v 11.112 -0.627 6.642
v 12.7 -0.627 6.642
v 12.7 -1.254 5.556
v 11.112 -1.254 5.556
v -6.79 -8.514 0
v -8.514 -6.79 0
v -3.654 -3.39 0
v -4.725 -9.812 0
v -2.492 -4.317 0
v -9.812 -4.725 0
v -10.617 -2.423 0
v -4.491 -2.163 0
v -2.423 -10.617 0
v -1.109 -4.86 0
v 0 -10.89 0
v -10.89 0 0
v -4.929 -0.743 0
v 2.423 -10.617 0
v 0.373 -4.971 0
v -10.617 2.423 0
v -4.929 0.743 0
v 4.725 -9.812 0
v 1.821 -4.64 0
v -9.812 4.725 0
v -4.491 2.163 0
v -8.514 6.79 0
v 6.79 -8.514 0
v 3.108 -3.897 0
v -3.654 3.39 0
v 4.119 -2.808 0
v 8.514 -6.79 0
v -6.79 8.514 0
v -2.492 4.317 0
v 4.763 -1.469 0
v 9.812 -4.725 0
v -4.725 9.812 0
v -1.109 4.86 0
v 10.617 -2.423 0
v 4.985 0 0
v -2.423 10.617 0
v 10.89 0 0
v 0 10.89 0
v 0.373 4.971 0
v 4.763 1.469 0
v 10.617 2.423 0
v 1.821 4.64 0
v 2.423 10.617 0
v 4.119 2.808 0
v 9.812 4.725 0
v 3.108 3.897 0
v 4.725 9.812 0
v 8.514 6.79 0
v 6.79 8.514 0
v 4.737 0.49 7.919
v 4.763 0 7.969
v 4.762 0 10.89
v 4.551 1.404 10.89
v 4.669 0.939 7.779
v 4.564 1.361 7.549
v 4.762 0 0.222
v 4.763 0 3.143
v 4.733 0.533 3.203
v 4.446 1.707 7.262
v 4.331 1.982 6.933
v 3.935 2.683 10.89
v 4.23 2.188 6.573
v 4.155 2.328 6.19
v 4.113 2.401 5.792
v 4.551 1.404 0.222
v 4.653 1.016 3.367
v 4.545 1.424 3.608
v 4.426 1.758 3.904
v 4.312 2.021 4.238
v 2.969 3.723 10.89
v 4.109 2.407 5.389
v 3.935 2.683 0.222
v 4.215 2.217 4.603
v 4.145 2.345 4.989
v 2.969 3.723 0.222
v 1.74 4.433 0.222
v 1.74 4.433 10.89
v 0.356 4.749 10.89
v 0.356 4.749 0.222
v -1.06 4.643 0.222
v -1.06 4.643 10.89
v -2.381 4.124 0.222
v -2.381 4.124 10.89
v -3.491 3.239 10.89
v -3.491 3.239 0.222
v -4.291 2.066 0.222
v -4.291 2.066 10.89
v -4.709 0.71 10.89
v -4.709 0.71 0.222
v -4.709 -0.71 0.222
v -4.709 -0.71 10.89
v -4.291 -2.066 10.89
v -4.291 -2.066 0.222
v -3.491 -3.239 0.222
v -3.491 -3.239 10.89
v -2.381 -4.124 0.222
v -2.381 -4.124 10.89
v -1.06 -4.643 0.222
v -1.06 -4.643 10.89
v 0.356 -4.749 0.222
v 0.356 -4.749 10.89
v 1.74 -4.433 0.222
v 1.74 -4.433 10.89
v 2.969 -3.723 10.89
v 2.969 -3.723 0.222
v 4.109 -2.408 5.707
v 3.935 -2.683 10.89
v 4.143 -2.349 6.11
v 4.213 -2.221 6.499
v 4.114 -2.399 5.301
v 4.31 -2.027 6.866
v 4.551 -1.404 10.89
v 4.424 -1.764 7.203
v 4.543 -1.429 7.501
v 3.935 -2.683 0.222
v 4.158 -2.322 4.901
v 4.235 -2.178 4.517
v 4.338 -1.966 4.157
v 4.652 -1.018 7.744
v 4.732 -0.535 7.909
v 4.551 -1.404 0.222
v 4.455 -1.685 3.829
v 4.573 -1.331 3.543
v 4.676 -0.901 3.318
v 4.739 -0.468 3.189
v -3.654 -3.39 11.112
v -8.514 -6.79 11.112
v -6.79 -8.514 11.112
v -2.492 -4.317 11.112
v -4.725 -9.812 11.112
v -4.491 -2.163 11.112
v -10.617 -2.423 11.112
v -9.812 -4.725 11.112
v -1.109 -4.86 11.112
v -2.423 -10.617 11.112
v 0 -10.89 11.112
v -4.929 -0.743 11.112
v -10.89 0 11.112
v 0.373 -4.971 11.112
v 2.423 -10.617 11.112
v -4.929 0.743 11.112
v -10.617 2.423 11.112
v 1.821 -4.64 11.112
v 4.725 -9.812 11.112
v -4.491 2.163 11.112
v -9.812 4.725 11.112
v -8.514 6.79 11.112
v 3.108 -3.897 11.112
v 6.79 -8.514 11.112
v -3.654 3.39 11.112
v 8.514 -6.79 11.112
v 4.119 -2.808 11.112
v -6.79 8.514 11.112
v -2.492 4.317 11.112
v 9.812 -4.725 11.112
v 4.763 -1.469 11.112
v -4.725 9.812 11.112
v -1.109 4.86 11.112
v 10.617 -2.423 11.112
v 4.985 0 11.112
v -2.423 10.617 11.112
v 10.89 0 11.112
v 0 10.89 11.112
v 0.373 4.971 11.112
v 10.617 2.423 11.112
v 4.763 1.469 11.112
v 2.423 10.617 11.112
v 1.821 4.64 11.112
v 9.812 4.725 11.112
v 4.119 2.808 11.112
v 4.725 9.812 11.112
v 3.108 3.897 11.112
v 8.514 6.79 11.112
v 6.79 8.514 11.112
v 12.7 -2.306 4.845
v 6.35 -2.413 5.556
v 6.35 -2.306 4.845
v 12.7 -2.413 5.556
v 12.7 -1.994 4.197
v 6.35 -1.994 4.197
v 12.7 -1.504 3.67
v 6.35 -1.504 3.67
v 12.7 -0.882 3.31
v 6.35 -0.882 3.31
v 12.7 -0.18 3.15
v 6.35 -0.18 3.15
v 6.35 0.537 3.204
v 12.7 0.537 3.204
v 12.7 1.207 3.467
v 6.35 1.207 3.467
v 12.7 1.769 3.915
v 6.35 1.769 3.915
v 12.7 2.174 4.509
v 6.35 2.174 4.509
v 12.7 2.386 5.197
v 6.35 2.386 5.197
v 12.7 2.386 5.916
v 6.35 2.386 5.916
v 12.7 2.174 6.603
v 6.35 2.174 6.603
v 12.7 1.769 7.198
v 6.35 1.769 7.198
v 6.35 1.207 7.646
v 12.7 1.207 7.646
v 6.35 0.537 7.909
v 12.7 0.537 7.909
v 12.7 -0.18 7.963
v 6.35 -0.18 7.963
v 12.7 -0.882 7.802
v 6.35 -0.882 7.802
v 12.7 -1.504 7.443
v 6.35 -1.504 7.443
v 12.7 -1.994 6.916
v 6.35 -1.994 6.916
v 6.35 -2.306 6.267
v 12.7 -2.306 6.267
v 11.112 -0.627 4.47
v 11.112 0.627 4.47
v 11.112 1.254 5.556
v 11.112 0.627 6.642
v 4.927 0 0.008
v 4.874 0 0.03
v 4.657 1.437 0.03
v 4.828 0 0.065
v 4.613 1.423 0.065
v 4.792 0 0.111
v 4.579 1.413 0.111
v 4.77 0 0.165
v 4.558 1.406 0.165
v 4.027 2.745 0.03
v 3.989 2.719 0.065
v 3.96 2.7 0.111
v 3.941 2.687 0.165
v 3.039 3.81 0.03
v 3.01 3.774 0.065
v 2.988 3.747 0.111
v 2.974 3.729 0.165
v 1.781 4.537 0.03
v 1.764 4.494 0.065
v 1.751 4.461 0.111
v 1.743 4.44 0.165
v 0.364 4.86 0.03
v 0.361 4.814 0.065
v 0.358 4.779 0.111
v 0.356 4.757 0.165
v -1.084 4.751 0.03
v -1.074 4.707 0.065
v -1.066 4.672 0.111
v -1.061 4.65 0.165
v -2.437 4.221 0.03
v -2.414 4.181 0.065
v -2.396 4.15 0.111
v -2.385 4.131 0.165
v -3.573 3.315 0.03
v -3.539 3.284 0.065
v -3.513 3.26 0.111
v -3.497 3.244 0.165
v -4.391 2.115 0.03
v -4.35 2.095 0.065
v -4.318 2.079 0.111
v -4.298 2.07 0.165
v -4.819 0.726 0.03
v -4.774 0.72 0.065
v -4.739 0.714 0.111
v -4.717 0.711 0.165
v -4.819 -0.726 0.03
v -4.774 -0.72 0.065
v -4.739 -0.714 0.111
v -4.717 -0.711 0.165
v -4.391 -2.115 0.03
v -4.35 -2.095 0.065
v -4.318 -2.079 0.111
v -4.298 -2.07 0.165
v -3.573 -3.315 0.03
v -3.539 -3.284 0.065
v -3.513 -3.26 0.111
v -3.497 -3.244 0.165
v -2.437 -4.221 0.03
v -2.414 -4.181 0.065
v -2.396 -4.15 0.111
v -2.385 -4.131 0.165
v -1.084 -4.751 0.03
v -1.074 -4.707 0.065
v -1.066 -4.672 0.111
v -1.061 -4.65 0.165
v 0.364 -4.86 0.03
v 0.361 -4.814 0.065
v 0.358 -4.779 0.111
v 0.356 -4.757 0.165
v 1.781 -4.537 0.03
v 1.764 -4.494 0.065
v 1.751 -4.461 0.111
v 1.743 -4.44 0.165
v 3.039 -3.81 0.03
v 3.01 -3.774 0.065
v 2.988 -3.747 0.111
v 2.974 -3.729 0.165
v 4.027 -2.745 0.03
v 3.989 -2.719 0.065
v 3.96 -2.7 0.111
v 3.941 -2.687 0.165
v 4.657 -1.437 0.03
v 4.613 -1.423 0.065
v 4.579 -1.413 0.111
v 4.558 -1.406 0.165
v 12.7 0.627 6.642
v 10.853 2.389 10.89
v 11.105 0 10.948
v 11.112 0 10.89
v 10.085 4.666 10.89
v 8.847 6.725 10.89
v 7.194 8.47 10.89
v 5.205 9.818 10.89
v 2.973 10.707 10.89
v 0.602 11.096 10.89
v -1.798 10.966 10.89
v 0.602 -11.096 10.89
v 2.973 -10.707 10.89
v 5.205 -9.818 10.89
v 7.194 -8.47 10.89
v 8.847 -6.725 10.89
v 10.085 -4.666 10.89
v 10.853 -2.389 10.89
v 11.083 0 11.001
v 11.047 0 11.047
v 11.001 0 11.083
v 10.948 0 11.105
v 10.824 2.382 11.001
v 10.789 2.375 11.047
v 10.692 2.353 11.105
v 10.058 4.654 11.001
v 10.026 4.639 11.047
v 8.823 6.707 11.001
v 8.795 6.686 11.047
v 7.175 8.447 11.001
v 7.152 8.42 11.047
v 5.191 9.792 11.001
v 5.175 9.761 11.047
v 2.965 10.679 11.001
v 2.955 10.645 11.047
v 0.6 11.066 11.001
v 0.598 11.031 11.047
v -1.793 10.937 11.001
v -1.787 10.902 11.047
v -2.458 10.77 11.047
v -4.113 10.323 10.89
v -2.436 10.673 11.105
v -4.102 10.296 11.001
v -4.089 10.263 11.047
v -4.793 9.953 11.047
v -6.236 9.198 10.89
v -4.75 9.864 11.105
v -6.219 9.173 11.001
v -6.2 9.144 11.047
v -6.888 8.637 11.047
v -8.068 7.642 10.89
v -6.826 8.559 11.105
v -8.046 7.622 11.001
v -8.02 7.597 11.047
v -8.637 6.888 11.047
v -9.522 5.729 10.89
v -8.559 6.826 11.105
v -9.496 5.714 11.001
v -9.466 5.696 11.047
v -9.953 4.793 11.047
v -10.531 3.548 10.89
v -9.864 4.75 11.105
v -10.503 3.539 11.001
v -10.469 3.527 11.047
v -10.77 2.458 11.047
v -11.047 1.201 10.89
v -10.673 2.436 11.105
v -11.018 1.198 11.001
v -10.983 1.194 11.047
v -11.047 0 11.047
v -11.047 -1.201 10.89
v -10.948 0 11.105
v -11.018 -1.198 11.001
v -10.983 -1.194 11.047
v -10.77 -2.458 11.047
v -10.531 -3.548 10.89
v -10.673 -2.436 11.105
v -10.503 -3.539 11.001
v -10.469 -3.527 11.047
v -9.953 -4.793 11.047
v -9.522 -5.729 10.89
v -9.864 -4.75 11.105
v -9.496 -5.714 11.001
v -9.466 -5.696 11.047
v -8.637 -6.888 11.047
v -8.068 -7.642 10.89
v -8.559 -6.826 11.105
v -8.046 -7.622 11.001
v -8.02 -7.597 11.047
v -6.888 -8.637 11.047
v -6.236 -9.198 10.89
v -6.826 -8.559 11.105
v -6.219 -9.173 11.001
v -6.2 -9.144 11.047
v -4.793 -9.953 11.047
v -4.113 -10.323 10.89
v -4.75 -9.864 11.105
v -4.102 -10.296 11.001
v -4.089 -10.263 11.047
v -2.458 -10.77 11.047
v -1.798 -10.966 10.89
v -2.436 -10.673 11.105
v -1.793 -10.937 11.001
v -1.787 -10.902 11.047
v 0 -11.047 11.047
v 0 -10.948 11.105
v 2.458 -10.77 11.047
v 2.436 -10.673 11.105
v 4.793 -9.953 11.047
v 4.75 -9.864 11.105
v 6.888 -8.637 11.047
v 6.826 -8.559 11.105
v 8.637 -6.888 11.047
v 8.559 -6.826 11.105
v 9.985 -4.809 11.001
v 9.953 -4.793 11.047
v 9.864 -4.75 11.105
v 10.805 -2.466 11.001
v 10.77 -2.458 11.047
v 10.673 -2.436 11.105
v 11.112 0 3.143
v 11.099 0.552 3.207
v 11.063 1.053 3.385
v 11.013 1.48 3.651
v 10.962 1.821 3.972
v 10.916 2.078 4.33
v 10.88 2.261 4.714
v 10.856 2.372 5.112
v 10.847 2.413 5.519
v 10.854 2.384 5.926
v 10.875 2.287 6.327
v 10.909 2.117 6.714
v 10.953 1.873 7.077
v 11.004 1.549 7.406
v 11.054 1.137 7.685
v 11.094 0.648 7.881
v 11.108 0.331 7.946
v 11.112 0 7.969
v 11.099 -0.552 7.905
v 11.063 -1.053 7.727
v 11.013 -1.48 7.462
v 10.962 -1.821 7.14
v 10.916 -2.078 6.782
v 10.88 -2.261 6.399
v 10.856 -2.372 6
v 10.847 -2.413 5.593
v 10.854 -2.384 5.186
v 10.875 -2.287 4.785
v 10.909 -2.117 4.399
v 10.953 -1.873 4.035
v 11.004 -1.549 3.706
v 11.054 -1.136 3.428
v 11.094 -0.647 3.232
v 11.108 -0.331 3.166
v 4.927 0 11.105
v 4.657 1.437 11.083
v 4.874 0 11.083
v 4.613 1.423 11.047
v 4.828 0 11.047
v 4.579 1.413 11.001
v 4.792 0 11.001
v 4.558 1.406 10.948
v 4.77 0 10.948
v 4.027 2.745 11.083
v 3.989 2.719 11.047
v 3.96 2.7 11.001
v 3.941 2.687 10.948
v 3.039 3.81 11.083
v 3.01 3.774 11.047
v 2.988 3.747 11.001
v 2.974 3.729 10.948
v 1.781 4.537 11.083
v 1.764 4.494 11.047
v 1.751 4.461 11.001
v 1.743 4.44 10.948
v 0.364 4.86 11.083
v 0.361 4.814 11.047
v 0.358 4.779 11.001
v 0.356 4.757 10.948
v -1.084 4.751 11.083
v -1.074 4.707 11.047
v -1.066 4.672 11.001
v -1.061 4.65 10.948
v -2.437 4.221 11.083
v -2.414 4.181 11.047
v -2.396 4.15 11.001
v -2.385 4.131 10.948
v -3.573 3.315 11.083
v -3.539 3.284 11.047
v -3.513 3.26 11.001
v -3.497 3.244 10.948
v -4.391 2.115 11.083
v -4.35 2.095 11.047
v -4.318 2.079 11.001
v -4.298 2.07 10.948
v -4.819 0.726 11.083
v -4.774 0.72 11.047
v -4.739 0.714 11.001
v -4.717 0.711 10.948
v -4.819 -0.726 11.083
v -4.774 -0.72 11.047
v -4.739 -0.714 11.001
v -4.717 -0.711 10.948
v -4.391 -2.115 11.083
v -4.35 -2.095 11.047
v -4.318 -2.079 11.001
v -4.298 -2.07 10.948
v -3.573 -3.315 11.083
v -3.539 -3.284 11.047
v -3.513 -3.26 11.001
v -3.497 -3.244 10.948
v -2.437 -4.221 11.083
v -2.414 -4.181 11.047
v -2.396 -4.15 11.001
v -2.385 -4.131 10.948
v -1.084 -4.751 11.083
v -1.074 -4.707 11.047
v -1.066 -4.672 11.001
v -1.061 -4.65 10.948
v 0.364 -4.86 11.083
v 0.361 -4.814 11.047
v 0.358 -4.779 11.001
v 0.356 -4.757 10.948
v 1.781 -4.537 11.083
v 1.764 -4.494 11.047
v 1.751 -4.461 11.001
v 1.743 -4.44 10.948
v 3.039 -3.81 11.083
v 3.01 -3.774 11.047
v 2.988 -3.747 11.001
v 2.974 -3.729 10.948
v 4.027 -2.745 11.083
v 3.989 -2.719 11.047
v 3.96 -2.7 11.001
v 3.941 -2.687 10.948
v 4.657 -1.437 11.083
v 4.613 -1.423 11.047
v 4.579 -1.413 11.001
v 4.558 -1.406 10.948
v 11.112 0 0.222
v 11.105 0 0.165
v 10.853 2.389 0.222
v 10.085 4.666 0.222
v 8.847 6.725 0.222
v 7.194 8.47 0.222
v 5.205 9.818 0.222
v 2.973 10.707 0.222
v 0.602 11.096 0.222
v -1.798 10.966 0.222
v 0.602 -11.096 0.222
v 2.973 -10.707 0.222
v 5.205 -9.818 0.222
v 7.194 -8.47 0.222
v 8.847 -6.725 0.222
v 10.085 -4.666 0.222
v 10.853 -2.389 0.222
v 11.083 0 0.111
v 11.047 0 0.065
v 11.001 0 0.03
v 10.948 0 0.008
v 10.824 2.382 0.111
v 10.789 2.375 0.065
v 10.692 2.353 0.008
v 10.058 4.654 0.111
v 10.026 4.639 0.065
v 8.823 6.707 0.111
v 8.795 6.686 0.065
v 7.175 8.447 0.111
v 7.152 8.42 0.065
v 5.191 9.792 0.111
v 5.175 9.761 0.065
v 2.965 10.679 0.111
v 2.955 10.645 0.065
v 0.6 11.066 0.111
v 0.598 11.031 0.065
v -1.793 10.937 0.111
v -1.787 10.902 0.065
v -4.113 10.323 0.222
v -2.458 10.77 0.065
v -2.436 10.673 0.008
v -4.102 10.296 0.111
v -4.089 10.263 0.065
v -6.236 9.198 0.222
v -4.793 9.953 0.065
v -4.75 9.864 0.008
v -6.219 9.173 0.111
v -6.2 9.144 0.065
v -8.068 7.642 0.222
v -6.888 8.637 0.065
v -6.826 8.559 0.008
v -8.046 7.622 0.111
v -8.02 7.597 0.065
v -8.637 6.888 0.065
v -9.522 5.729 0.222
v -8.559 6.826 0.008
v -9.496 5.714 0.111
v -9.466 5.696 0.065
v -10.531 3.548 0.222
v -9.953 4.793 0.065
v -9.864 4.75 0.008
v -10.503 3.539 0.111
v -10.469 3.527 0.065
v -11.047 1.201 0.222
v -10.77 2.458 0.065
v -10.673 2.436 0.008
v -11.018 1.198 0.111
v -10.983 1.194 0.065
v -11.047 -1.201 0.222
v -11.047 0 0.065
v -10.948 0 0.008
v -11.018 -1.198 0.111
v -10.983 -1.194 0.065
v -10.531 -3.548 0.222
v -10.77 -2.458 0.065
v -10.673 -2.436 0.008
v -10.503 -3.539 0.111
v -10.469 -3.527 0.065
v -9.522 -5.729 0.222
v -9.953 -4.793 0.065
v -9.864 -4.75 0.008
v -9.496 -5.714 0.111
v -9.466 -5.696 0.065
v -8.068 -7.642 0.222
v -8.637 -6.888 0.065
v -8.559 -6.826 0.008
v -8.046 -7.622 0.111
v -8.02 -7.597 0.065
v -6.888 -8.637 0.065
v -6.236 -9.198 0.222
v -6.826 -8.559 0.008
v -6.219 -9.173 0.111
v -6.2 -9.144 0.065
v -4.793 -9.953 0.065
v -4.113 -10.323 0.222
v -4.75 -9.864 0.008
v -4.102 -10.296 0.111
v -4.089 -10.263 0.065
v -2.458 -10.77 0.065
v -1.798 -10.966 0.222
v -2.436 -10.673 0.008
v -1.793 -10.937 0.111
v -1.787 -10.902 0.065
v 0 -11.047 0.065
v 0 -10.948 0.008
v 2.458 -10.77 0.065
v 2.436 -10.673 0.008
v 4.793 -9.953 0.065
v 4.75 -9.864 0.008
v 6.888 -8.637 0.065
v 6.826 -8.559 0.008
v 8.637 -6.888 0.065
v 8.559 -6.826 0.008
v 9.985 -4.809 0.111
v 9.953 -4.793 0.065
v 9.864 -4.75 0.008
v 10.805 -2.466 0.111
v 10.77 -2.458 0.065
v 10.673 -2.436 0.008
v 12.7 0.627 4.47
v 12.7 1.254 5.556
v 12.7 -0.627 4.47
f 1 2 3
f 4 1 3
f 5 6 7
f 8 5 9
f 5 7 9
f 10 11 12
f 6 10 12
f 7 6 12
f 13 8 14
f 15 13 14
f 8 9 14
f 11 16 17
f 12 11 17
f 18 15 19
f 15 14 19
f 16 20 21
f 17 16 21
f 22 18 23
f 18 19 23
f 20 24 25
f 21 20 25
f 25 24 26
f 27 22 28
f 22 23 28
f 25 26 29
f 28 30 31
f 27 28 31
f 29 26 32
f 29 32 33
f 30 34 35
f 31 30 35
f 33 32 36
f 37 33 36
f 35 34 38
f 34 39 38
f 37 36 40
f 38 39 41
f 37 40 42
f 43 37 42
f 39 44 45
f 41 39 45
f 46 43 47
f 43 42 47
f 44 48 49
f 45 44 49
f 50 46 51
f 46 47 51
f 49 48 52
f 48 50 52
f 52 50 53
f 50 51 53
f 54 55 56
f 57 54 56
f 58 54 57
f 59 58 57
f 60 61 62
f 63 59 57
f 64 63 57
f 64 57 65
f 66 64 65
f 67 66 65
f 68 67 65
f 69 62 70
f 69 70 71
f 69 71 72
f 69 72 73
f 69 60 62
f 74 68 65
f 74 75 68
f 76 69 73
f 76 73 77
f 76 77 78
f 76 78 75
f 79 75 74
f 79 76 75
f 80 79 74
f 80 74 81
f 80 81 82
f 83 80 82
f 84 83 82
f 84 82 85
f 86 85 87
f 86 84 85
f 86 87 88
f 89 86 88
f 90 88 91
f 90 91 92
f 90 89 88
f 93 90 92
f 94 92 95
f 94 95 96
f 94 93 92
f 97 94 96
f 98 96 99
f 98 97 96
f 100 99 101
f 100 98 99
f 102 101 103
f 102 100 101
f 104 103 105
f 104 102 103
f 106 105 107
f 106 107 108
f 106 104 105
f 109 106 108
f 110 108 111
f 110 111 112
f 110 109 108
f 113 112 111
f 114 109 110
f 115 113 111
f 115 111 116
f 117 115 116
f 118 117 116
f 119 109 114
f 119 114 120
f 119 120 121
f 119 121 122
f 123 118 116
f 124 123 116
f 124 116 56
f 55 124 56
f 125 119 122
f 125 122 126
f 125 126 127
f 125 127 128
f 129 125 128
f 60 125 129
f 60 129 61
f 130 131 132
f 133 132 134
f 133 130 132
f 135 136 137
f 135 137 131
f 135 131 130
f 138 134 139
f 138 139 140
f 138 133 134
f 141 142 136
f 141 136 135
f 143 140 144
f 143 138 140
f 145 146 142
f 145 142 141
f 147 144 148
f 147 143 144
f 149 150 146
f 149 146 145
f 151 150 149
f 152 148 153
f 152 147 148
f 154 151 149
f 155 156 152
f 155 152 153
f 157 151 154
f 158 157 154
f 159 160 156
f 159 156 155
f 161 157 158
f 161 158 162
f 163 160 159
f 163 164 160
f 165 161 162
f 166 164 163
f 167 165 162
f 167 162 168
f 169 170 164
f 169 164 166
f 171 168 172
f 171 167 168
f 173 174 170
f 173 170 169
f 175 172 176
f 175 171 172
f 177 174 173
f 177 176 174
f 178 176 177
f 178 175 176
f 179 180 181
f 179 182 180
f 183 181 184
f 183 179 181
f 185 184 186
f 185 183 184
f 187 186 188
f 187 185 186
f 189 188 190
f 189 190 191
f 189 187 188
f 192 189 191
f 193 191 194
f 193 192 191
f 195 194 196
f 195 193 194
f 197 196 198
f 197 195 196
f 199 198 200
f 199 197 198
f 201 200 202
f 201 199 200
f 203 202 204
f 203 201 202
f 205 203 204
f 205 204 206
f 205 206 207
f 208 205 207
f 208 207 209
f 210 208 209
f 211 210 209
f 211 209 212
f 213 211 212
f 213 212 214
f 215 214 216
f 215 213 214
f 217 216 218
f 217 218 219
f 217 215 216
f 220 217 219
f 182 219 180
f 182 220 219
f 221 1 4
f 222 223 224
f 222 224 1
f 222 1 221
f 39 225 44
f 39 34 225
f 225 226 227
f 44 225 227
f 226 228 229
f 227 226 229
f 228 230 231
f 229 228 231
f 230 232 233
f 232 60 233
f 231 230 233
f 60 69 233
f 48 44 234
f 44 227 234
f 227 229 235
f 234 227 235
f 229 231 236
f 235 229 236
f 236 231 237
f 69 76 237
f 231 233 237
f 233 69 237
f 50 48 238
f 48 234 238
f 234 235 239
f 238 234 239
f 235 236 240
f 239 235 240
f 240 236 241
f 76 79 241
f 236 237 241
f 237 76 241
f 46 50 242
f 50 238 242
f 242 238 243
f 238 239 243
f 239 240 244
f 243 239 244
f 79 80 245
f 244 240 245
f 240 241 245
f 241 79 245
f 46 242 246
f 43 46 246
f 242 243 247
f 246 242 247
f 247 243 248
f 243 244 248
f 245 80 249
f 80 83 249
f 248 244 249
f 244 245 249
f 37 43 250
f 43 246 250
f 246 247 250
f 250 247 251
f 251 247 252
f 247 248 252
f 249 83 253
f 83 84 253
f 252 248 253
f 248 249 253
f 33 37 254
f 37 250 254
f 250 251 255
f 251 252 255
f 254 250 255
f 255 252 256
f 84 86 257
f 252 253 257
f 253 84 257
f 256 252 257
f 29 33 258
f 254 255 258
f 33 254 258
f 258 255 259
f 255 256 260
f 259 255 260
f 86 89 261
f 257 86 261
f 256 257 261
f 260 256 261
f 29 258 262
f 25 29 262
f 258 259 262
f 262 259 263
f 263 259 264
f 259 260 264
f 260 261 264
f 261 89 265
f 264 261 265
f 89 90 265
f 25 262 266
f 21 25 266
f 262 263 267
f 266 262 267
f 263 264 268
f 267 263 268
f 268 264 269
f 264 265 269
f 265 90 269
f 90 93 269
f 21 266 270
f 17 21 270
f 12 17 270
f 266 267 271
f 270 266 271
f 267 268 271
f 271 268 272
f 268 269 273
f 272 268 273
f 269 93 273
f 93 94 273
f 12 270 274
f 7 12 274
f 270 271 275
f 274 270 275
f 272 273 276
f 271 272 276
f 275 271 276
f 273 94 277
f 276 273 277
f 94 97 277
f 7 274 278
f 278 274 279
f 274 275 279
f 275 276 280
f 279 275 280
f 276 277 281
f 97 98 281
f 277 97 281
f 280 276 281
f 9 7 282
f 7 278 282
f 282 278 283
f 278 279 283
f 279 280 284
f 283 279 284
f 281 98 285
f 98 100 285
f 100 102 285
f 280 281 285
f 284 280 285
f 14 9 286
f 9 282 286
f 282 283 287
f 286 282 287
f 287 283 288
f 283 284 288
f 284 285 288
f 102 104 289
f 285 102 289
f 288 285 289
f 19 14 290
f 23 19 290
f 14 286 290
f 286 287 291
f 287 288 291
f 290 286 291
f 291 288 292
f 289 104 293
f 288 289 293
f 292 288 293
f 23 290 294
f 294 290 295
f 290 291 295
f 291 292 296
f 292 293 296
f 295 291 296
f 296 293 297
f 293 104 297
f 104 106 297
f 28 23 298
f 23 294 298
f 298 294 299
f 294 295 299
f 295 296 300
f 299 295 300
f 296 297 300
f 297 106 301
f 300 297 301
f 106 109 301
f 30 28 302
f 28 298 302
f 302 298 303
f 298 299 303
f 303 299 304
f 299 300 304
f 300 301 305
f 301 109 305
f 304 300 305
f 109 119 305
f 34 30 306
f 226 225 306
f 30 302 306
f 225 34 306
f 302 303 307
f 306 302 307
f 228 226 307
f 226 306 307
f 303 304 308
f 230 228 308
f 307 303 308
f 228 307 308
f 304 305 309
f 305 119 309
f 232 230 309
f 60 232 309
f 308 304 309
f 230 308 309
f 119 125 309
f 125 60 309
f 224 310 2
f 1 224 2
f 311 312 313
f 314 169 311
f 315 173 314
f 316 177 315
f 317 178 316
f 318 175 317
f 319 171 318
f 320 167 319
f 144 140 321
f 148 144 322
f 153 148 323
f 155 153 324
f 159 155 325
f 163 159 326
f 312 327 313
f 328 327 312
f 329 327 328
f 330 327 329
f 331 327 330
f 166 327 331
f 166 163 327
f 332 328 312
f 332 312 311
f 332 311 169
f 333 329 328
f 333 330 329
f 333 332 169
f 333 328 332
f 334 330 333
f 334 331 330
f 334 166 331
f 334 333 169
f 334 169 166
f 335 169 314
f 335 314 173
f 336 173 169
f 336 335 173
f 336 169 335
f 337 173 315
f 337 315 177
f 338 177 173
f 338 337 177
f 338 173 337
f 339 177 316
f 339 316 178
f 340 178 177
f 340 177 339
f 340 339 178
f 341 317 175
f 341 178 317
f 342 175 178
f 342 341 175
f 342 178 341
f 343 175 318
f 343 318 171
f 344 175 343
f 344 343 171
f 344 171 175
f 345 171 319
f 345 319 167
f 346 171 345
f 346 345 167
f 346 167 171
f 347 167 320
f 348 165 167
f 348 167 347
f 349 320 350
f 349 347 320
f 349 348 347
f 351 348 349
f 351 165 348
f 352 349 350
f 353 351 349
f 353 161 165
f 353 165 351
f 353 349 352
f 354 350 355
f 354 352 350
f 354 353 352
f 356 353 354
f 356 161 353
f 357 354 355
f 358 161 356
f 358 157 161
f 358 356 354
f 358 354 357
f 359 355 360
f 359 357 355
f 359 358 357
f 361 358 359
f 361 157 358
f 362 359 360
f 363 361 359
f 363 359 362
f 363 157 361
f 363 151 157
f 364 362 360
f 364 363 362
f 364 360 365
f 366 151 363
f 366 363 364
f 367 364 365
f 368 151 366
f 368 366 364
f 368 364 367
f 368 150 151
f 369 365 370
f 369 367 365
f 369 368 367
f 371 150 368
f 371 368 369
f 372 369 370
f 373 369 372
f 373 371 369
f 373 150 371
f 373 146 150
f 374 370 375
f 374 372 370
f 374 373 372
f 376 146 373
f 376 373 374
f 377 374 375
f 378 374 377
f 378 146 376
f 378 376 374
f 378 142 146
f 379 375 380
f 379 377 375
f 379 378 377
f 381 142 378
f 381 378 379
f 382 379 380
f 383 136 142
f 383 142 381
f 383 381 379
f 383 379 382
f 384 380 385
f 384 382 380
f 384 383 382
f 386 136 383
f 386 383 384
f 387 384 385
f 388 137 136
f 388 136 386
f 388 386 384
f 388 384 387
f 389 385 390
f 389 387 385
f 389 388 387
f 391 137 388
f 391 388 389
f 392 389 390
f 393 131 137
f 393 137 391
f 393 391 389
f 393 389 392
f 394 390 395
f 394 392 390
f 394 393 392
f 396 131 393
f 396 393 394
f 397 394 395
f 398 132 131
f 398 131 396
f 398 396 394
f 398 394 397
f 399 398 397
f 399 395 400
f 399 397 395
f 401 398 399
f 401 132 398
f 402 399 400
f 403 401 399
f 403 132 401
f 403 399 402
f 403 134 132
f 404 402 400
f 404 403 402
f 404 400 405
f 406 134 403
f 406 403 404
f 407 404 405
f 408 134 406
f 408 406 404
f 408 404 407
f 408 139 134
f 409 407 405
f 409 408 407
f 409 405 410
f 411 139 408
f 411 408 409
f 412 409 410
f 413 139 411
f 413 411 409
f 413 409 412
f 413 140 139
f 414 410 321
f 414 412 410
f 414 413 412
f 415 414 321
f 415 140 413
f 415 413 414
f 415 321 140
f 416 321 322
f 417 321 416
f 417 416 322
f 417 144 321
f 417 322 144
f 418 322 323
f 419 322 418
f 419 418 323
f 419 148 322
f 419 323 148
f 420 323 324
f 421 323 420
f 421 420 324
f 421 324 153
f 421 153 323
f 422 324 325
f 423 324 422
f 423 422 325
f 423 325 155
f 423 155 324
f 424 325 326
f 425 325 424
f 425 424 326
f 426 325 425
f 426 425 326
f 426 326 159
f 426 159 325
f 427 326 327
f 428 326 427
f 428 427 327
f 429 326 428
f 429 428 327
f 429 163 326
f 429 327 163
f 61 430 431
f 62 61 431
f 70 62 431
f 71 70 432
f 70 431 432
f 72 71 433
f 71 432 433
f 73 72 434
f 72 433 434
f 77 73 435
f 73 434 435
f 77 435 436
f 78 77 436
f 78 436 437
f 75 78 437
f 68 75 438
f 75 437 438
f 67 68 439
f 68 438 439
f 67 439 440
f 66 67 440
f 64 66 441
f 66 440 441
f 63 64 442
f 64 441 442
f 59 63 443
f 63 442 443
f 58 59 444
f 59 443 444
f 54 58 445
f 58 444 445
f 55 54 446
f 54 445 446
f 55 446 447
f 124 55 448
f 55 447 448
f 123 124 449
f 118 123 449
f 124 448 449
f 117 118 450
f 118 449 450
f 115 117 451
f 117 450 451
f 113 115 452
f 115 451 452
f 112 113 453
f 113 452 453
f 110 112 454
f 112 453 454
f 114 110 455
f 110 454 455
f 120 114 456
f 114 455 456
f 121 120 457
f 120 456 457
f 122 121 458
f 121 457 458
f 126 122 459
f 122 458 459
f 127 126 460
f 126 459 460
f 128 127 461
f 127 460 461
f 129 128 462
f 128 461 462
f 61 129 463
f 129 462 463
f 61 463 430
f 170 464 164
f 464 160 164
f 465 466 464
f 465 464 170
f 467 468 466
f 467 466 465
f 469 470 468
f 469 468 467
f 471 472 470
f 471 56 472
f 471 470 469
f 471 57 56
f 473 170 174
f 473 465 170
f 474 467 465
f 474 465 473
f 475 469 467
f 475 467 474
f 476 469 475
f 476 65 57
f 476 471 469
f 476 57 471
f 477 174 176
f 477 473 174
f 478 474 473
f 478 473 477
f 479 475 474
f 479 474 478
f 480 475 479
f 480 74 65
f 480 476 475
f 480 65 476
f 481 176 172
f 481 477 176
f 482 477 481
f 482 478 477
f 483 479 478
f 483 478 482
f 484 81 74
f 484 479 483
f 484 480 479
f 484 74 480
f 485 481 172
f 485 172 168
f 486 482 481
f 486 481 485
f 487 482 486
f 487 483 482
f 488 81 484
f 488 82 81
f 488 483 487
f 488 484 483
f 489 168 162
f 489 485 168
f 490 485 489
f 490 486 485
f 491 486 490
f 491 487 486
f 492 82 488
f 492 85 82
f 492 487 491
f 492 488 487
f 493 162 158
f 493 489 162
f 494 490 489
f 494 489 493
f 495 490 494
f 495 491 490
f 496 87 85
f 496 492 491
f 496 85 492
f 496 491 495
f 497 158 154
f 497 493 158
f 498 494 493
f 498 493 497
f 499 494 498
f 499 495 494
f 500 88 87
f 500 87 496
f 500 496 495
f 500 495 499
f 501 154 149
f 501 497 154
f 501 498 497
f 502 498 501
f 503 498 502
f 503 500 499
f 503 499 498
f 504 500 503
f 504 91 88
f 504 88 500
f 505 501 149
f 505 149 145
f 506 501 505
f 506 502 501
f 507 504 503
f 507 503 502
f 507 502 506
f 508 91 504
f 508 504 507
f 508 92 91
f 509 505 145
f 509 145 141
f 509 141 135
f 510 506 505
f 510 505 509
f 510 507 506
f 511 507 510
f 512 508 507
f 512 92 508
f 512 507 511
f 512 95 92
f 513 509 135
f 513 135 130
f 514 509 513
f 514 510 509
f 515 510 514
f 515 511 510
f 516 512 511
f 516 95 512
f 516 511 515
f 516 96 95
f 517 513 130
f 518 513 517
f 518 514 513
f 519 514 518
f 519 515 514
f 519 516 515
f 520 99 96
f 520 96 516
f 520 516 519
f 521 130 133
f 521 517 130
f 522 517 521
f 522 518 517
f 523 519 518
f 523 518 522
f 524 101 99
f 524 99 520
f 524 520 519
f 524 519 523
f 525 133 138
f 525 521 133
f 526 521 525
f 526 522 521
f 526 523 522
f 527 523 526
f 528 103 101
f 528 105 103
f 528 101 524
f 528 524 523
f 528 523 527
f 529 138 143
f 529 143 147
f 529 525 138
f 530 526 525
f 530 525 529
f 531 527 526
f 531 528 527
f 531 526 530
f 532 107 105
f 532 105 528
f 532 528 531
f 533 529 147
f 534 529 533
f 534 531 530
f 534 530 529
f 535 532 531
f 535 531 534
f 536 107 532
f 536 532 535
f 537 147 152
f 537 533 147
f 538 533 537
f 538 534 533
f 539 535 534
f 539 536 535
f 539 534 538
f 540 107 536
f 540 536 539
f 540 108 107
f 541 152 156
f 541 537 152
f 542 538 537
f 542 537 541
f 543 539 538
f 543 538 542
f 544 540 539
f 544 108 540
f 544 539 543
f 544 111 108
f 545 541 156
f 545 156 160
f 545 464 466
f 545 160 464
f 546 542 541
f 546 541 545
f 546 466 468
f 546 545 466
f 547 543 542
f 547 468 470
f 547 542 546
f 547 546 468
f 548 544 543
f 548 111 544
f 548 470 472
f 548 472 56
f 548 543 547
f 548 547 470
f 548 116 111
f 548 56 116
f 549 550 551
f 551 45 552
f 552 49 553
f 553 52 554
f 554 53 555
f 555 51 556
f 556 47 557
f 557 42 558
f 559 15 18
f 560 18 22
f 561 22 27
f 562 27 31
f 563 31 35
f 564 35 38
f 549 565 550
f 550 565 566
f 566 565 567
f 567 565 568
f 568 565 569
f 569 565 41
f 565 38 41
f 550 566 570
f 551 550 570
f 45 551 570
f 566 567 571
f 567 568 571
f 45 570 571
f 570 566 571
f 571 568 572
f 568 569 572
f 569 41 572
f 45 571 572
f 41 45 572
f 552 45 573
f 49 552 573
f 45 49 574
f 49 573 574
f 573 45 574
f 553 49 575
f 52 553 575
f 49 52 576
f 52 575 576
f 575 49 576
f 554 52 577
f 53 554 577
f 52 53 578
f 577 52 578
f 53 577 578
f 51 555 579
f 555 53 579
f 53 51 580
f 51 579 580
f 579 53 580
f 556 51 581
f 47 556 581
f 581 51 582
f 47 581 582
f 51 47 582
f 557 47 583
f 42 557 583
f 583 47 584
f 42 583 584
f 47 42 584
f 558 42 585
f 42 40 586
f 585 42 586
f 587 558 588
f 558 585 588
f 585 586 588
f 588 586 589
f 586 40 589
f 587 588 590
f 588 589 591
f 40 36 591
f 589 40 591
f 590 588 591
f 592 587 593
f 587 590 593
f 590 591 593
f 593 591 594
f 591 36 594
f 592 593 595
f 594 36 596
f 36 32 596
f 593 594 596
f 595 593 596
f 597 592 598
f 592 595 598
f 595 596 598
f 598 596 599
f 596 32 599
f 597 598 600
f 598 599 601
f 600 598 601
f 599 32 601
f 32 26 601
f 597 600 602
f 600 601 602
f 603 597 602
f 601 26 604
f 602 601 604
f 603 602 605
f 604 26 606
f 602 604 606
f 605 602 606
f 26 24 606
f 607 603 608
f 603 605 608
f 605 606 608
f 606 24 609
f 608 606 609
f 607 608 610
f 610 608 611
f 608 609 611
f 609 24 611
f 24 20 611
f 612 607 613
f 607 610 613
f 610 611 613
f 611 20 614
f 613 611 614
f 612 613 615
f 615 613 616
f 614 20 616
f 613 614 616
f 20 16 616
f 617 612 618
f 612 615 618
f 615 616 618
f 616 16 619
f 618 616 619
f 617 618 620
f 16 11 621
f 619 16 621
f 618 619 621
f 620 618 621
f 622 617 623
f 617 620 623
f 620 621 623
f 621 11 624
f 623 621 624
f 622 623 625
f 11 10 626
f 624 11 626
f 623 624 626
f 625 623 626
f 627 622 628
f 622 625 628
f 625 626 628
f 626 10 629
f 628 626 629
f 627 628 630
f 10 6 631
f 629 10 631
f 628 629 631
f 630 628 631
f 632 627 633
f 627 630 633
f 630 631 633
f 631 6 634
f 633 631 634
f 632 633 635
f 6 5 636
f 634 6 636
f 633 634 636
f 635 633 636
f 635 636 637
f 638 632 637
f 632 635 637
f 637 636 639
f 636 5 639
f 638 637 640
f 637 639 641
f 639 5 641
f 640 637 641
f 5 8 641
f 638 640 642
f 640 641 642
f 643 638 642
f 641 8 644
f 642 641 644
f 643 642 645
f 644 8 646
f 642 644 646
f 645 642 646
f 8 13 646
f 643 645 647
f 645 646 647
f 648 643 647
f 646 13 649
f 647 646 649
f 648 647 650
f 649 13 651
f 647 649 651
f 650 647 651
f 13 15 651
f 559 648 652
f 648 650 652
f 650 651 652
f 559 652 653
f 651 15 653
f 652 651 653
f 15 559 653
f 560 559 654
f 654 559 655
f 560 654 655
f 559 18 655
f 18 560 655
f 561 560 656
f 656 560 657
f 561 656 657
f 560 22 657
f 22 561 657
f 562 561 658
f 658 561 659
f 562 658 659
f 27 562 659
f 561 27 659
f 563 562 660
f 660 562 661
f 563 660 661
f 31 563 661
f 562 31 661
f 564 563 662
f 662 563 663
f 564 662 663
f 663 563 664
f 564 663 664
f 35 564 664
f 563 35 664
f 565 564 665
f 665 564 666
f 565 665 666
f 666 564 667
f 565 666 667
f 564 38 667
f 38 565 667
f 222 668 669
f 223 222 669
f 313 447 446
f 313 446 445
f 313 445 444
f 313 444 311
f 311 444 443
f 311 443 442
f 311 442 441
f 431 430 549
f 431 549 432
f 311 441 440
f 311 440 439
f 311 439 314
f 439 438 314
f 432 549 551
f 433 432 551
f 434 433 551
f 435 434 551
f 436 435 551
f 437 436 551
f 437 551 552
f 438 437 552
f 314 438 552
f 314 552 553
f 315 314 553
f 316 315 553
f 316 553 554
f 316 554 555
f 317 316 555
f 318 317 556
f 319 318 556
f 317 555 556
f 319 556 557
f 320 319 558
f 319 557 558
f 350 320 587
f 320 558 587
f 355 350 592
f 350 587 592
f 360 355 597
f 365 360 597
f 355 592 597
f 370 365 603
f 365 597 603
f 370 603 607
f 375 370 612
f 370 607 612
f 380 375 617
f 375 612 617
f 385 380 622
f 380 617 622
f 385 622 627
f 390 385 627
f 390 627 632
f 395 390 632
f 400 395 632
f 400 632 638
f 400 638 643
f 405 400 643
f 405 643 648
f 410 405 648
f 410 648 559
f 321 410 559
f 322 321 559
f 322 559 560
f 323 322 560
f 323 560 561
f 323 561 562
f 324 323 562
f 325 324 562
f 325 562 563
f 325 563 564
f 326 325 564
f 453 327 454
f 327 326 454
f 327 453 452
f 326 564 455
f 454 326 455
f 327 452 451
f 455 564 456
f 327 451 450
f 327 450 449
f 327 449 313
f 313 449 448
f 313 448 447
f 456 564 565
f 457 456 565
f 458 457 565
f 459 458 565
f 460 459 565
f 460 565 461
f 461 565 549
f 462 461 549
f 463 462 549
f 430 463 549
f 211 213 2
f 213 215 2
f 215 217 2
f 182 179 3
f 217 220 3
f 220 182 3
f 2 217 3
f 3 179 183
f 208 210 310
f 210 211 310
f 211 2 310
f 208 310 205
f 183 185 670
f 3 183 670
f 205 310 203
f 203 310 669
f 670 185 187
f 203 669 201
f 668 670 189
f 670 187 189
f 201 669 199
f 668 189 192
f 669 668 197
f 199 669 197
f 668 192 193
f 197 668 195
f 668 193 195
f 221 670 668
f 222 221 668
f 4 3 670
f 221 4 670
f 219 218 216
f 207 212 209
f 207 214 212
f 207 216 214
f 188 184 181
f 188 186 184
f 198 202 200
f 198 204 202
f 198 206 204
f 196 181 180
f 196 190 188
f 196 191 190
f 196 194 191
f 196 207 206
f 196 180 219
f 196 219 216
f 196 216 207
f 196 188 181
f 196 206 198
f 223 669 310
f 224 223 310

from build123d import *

# Parameters (mm, degrees)
SKETCH1_R               = 11.1125
SKETCH1_R_2             = 4.7625
EXTRUDE1_DEPTH          = 11.1125
CUT_EXTRUDE1_REACH      = 29.22
CUT_EXTRUDE1_END_RADIUS = 4.7625
SKETCH2_R               = 2.413
SKETCH3_W               = 6.35
SKETCH3_H               = 2.413
CUT_EXTRUDE2_DEPTH      = 1.5875
FILLET1_R               = 0.22225


with BuildPart() as part:
    # Sketch1 → Extrude1 (new body)
    with BuildSketch(Plane.XY):
        Circle(SKETCH1_R)
        Circle(SKETCH1_R_2, mode=Mode.SUBTRACT)
    extrude(amount=EXTRUDE1_DEPTH)

    # Cut-Extrude1: up to this cylinder (the profile starts outside it)
    cut_extrude1_end = Plane(origin=(0, 0, 5.55625), z_dir=(0, 0, -1)) * Cylinder(CUT_EXTRUDE1_END_RADIUS, 68.965, mode=Mode.PRIVATE)
    # Sketch2 → Cut-Extrude1 (cut, up to the surface)
    with BuildSketch(Plane(origin=(11.1125, 0, 0), x_dir=(0, 0, -1), z_dir=(1, 0, 0)), mode=Mode.PRIVATE) as cut_extrude1_sk1:
        with Locations((-5.55625, 0)):
            Circle(SKETCH2_R)
    cut_extrude1_tool1 = extrude(cut_extrude1_sk1.sketch, amount=-CUT_EXTRUDE1_REACH, mode=Mode.PRIVATE) - cut_extrude1_end
    add(cut_extrude1_tool1.solids().sort_by_distance((11.1125, 0, 5.55625))[0], mode=Mode.SUBTRACT)

    # Fillet1
    fillet1_edges = [part.edges().sort_by_distance(p)[0] for p in [
        (-11.1125, 0, 0),
        (-11.1125, 0, 11.1125),
        (-4.7625, 0, 0),
        (-4.7625, 0, 11.1125),
    ]]
    fillet(fillet1_edges, radius=FILLET1_R)


with BuildPart() as body_2:
    # Sketch3 → Revolve1 (revolve)
    with BuildSketch(Plane.XY.offset(5.55625), mode=Mode.PRIVATE) as revolve1_sk:
        with Locations((9.525, 1.2065)):
            Rectangle(SKETCH3_W, SKETCH3_H)
    revolve(revolve1_sk.sketch.rotate(Axis((6.35, 0, 5.55625), (1, 0, 0)), 180), axis=Axis((6.35, 0, 5.55625), (1, 0, 0)))

    # Sketch4 → Cut-Extrude2 (cut)
    with BuildSketch(Plane(origin=(12.7, 0, 0), x_dir=(0, 0, -1), z_dir=(1, 0, 0))):
        Polygon((-5.55625, 1.25383158), (-6.6421, 0.62691579), (-6.6421, -0.62691579), (-5.55625, -1.25383158), (-4.4704, -0.62691579), (-4.4704, 0.62691579), align=None)
    extrude(amount=-CUT_EXTRUDE2_DEPTH, mode=Mode.SUBTRACT)


solid = Compound([part.part, body_2.part])
